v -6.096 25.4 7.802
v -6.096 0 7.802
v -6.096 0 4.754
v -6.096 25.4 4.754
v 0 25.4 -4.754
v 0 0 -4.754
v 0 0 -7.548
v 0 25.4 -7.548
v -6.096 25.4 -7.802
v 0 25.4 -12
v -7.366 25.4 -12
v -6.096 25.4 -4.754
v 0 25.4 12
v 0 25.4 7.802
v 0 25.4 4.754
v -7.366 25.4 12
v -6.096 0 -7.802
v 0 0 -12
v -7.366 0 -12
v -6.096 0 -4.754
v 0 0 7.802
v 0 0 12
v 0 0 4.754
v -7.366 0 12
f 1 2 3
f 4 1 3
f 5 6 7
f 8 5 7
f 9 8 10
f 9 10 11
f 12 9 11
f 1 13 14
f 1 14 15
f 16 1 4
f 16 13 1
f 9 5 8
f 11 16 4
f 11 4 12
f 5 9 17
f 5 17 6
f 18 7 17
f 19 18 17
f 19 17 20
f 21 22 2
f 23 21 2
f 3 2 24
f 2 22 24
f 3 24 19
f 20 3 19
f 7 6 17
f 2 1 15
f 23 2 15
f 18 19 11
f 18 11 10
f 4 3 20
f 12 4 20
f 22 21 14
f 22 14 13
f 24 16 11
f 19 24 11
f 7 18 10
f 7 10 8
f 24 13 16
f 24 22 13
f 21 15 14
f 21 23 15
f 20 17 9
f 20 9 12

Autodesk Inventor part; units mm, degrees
ref_plane "YZ Plane" through (0, 0, 0) normal (1, 0, 0) x (0, 1, 0)
ref_plane "XZ Plane" through (0, 0, 0) normal (0, 1, 0) x (-1, 0, 0)
ref_plane "XY Plane" through (0, 0, 0) normal (0, 0, 1) x (1, 0, 0)
sketch "Sketch1" plane through (0, 0, 0) normal (0, 1, 0) x (-1, 0, 0)
  line L0 (0, 12) -> (7.366, 12)
  line L1 (7.366, 12) -> (7.366, -12)
  line L2 (7.366, -12) -> (0, -12)
  line L3 (6.096, 4.754) -> (6.096, -4.754)
  line L4 (0, 4.754) -> (0, 7.802)
  line L5 (6.096, 7.802) -> (6.096, 4.754)
  line L6 (0, -4.754) -> (0, -7.548)
  line L7 (6.096, -7.802) -> (6.096, -4.754)
  line L8 (6.096, 7.802) -> (0, 4.754)
  line L9 (6.096, -7.802) -> (0, -4.754)
  line L10 (0, -12) -> (0, -4.754)
  line L11 (0, 4.754) -> (0, 12)
  point P0 (0, 0)
  dimension "d0" = 7.366
  dimension "d1" = 24
  dimension "d2" = 12
  dimension "d8" = 9.508
  dimension "d9" = 4.754
  dimension "d10" = 3.048
  dimension "d11" = 3.048
  dimension "d12" = 6.096
extrude "Extrusion1" add sketch "Sketch1" along normal blind 25.4
equation "\"d2\" = 0.5 * d1"
equation "\"d9\" = 0.5 * d8"
equation "\"d11\" = d10"
properties part number "Sliding test receiver"
